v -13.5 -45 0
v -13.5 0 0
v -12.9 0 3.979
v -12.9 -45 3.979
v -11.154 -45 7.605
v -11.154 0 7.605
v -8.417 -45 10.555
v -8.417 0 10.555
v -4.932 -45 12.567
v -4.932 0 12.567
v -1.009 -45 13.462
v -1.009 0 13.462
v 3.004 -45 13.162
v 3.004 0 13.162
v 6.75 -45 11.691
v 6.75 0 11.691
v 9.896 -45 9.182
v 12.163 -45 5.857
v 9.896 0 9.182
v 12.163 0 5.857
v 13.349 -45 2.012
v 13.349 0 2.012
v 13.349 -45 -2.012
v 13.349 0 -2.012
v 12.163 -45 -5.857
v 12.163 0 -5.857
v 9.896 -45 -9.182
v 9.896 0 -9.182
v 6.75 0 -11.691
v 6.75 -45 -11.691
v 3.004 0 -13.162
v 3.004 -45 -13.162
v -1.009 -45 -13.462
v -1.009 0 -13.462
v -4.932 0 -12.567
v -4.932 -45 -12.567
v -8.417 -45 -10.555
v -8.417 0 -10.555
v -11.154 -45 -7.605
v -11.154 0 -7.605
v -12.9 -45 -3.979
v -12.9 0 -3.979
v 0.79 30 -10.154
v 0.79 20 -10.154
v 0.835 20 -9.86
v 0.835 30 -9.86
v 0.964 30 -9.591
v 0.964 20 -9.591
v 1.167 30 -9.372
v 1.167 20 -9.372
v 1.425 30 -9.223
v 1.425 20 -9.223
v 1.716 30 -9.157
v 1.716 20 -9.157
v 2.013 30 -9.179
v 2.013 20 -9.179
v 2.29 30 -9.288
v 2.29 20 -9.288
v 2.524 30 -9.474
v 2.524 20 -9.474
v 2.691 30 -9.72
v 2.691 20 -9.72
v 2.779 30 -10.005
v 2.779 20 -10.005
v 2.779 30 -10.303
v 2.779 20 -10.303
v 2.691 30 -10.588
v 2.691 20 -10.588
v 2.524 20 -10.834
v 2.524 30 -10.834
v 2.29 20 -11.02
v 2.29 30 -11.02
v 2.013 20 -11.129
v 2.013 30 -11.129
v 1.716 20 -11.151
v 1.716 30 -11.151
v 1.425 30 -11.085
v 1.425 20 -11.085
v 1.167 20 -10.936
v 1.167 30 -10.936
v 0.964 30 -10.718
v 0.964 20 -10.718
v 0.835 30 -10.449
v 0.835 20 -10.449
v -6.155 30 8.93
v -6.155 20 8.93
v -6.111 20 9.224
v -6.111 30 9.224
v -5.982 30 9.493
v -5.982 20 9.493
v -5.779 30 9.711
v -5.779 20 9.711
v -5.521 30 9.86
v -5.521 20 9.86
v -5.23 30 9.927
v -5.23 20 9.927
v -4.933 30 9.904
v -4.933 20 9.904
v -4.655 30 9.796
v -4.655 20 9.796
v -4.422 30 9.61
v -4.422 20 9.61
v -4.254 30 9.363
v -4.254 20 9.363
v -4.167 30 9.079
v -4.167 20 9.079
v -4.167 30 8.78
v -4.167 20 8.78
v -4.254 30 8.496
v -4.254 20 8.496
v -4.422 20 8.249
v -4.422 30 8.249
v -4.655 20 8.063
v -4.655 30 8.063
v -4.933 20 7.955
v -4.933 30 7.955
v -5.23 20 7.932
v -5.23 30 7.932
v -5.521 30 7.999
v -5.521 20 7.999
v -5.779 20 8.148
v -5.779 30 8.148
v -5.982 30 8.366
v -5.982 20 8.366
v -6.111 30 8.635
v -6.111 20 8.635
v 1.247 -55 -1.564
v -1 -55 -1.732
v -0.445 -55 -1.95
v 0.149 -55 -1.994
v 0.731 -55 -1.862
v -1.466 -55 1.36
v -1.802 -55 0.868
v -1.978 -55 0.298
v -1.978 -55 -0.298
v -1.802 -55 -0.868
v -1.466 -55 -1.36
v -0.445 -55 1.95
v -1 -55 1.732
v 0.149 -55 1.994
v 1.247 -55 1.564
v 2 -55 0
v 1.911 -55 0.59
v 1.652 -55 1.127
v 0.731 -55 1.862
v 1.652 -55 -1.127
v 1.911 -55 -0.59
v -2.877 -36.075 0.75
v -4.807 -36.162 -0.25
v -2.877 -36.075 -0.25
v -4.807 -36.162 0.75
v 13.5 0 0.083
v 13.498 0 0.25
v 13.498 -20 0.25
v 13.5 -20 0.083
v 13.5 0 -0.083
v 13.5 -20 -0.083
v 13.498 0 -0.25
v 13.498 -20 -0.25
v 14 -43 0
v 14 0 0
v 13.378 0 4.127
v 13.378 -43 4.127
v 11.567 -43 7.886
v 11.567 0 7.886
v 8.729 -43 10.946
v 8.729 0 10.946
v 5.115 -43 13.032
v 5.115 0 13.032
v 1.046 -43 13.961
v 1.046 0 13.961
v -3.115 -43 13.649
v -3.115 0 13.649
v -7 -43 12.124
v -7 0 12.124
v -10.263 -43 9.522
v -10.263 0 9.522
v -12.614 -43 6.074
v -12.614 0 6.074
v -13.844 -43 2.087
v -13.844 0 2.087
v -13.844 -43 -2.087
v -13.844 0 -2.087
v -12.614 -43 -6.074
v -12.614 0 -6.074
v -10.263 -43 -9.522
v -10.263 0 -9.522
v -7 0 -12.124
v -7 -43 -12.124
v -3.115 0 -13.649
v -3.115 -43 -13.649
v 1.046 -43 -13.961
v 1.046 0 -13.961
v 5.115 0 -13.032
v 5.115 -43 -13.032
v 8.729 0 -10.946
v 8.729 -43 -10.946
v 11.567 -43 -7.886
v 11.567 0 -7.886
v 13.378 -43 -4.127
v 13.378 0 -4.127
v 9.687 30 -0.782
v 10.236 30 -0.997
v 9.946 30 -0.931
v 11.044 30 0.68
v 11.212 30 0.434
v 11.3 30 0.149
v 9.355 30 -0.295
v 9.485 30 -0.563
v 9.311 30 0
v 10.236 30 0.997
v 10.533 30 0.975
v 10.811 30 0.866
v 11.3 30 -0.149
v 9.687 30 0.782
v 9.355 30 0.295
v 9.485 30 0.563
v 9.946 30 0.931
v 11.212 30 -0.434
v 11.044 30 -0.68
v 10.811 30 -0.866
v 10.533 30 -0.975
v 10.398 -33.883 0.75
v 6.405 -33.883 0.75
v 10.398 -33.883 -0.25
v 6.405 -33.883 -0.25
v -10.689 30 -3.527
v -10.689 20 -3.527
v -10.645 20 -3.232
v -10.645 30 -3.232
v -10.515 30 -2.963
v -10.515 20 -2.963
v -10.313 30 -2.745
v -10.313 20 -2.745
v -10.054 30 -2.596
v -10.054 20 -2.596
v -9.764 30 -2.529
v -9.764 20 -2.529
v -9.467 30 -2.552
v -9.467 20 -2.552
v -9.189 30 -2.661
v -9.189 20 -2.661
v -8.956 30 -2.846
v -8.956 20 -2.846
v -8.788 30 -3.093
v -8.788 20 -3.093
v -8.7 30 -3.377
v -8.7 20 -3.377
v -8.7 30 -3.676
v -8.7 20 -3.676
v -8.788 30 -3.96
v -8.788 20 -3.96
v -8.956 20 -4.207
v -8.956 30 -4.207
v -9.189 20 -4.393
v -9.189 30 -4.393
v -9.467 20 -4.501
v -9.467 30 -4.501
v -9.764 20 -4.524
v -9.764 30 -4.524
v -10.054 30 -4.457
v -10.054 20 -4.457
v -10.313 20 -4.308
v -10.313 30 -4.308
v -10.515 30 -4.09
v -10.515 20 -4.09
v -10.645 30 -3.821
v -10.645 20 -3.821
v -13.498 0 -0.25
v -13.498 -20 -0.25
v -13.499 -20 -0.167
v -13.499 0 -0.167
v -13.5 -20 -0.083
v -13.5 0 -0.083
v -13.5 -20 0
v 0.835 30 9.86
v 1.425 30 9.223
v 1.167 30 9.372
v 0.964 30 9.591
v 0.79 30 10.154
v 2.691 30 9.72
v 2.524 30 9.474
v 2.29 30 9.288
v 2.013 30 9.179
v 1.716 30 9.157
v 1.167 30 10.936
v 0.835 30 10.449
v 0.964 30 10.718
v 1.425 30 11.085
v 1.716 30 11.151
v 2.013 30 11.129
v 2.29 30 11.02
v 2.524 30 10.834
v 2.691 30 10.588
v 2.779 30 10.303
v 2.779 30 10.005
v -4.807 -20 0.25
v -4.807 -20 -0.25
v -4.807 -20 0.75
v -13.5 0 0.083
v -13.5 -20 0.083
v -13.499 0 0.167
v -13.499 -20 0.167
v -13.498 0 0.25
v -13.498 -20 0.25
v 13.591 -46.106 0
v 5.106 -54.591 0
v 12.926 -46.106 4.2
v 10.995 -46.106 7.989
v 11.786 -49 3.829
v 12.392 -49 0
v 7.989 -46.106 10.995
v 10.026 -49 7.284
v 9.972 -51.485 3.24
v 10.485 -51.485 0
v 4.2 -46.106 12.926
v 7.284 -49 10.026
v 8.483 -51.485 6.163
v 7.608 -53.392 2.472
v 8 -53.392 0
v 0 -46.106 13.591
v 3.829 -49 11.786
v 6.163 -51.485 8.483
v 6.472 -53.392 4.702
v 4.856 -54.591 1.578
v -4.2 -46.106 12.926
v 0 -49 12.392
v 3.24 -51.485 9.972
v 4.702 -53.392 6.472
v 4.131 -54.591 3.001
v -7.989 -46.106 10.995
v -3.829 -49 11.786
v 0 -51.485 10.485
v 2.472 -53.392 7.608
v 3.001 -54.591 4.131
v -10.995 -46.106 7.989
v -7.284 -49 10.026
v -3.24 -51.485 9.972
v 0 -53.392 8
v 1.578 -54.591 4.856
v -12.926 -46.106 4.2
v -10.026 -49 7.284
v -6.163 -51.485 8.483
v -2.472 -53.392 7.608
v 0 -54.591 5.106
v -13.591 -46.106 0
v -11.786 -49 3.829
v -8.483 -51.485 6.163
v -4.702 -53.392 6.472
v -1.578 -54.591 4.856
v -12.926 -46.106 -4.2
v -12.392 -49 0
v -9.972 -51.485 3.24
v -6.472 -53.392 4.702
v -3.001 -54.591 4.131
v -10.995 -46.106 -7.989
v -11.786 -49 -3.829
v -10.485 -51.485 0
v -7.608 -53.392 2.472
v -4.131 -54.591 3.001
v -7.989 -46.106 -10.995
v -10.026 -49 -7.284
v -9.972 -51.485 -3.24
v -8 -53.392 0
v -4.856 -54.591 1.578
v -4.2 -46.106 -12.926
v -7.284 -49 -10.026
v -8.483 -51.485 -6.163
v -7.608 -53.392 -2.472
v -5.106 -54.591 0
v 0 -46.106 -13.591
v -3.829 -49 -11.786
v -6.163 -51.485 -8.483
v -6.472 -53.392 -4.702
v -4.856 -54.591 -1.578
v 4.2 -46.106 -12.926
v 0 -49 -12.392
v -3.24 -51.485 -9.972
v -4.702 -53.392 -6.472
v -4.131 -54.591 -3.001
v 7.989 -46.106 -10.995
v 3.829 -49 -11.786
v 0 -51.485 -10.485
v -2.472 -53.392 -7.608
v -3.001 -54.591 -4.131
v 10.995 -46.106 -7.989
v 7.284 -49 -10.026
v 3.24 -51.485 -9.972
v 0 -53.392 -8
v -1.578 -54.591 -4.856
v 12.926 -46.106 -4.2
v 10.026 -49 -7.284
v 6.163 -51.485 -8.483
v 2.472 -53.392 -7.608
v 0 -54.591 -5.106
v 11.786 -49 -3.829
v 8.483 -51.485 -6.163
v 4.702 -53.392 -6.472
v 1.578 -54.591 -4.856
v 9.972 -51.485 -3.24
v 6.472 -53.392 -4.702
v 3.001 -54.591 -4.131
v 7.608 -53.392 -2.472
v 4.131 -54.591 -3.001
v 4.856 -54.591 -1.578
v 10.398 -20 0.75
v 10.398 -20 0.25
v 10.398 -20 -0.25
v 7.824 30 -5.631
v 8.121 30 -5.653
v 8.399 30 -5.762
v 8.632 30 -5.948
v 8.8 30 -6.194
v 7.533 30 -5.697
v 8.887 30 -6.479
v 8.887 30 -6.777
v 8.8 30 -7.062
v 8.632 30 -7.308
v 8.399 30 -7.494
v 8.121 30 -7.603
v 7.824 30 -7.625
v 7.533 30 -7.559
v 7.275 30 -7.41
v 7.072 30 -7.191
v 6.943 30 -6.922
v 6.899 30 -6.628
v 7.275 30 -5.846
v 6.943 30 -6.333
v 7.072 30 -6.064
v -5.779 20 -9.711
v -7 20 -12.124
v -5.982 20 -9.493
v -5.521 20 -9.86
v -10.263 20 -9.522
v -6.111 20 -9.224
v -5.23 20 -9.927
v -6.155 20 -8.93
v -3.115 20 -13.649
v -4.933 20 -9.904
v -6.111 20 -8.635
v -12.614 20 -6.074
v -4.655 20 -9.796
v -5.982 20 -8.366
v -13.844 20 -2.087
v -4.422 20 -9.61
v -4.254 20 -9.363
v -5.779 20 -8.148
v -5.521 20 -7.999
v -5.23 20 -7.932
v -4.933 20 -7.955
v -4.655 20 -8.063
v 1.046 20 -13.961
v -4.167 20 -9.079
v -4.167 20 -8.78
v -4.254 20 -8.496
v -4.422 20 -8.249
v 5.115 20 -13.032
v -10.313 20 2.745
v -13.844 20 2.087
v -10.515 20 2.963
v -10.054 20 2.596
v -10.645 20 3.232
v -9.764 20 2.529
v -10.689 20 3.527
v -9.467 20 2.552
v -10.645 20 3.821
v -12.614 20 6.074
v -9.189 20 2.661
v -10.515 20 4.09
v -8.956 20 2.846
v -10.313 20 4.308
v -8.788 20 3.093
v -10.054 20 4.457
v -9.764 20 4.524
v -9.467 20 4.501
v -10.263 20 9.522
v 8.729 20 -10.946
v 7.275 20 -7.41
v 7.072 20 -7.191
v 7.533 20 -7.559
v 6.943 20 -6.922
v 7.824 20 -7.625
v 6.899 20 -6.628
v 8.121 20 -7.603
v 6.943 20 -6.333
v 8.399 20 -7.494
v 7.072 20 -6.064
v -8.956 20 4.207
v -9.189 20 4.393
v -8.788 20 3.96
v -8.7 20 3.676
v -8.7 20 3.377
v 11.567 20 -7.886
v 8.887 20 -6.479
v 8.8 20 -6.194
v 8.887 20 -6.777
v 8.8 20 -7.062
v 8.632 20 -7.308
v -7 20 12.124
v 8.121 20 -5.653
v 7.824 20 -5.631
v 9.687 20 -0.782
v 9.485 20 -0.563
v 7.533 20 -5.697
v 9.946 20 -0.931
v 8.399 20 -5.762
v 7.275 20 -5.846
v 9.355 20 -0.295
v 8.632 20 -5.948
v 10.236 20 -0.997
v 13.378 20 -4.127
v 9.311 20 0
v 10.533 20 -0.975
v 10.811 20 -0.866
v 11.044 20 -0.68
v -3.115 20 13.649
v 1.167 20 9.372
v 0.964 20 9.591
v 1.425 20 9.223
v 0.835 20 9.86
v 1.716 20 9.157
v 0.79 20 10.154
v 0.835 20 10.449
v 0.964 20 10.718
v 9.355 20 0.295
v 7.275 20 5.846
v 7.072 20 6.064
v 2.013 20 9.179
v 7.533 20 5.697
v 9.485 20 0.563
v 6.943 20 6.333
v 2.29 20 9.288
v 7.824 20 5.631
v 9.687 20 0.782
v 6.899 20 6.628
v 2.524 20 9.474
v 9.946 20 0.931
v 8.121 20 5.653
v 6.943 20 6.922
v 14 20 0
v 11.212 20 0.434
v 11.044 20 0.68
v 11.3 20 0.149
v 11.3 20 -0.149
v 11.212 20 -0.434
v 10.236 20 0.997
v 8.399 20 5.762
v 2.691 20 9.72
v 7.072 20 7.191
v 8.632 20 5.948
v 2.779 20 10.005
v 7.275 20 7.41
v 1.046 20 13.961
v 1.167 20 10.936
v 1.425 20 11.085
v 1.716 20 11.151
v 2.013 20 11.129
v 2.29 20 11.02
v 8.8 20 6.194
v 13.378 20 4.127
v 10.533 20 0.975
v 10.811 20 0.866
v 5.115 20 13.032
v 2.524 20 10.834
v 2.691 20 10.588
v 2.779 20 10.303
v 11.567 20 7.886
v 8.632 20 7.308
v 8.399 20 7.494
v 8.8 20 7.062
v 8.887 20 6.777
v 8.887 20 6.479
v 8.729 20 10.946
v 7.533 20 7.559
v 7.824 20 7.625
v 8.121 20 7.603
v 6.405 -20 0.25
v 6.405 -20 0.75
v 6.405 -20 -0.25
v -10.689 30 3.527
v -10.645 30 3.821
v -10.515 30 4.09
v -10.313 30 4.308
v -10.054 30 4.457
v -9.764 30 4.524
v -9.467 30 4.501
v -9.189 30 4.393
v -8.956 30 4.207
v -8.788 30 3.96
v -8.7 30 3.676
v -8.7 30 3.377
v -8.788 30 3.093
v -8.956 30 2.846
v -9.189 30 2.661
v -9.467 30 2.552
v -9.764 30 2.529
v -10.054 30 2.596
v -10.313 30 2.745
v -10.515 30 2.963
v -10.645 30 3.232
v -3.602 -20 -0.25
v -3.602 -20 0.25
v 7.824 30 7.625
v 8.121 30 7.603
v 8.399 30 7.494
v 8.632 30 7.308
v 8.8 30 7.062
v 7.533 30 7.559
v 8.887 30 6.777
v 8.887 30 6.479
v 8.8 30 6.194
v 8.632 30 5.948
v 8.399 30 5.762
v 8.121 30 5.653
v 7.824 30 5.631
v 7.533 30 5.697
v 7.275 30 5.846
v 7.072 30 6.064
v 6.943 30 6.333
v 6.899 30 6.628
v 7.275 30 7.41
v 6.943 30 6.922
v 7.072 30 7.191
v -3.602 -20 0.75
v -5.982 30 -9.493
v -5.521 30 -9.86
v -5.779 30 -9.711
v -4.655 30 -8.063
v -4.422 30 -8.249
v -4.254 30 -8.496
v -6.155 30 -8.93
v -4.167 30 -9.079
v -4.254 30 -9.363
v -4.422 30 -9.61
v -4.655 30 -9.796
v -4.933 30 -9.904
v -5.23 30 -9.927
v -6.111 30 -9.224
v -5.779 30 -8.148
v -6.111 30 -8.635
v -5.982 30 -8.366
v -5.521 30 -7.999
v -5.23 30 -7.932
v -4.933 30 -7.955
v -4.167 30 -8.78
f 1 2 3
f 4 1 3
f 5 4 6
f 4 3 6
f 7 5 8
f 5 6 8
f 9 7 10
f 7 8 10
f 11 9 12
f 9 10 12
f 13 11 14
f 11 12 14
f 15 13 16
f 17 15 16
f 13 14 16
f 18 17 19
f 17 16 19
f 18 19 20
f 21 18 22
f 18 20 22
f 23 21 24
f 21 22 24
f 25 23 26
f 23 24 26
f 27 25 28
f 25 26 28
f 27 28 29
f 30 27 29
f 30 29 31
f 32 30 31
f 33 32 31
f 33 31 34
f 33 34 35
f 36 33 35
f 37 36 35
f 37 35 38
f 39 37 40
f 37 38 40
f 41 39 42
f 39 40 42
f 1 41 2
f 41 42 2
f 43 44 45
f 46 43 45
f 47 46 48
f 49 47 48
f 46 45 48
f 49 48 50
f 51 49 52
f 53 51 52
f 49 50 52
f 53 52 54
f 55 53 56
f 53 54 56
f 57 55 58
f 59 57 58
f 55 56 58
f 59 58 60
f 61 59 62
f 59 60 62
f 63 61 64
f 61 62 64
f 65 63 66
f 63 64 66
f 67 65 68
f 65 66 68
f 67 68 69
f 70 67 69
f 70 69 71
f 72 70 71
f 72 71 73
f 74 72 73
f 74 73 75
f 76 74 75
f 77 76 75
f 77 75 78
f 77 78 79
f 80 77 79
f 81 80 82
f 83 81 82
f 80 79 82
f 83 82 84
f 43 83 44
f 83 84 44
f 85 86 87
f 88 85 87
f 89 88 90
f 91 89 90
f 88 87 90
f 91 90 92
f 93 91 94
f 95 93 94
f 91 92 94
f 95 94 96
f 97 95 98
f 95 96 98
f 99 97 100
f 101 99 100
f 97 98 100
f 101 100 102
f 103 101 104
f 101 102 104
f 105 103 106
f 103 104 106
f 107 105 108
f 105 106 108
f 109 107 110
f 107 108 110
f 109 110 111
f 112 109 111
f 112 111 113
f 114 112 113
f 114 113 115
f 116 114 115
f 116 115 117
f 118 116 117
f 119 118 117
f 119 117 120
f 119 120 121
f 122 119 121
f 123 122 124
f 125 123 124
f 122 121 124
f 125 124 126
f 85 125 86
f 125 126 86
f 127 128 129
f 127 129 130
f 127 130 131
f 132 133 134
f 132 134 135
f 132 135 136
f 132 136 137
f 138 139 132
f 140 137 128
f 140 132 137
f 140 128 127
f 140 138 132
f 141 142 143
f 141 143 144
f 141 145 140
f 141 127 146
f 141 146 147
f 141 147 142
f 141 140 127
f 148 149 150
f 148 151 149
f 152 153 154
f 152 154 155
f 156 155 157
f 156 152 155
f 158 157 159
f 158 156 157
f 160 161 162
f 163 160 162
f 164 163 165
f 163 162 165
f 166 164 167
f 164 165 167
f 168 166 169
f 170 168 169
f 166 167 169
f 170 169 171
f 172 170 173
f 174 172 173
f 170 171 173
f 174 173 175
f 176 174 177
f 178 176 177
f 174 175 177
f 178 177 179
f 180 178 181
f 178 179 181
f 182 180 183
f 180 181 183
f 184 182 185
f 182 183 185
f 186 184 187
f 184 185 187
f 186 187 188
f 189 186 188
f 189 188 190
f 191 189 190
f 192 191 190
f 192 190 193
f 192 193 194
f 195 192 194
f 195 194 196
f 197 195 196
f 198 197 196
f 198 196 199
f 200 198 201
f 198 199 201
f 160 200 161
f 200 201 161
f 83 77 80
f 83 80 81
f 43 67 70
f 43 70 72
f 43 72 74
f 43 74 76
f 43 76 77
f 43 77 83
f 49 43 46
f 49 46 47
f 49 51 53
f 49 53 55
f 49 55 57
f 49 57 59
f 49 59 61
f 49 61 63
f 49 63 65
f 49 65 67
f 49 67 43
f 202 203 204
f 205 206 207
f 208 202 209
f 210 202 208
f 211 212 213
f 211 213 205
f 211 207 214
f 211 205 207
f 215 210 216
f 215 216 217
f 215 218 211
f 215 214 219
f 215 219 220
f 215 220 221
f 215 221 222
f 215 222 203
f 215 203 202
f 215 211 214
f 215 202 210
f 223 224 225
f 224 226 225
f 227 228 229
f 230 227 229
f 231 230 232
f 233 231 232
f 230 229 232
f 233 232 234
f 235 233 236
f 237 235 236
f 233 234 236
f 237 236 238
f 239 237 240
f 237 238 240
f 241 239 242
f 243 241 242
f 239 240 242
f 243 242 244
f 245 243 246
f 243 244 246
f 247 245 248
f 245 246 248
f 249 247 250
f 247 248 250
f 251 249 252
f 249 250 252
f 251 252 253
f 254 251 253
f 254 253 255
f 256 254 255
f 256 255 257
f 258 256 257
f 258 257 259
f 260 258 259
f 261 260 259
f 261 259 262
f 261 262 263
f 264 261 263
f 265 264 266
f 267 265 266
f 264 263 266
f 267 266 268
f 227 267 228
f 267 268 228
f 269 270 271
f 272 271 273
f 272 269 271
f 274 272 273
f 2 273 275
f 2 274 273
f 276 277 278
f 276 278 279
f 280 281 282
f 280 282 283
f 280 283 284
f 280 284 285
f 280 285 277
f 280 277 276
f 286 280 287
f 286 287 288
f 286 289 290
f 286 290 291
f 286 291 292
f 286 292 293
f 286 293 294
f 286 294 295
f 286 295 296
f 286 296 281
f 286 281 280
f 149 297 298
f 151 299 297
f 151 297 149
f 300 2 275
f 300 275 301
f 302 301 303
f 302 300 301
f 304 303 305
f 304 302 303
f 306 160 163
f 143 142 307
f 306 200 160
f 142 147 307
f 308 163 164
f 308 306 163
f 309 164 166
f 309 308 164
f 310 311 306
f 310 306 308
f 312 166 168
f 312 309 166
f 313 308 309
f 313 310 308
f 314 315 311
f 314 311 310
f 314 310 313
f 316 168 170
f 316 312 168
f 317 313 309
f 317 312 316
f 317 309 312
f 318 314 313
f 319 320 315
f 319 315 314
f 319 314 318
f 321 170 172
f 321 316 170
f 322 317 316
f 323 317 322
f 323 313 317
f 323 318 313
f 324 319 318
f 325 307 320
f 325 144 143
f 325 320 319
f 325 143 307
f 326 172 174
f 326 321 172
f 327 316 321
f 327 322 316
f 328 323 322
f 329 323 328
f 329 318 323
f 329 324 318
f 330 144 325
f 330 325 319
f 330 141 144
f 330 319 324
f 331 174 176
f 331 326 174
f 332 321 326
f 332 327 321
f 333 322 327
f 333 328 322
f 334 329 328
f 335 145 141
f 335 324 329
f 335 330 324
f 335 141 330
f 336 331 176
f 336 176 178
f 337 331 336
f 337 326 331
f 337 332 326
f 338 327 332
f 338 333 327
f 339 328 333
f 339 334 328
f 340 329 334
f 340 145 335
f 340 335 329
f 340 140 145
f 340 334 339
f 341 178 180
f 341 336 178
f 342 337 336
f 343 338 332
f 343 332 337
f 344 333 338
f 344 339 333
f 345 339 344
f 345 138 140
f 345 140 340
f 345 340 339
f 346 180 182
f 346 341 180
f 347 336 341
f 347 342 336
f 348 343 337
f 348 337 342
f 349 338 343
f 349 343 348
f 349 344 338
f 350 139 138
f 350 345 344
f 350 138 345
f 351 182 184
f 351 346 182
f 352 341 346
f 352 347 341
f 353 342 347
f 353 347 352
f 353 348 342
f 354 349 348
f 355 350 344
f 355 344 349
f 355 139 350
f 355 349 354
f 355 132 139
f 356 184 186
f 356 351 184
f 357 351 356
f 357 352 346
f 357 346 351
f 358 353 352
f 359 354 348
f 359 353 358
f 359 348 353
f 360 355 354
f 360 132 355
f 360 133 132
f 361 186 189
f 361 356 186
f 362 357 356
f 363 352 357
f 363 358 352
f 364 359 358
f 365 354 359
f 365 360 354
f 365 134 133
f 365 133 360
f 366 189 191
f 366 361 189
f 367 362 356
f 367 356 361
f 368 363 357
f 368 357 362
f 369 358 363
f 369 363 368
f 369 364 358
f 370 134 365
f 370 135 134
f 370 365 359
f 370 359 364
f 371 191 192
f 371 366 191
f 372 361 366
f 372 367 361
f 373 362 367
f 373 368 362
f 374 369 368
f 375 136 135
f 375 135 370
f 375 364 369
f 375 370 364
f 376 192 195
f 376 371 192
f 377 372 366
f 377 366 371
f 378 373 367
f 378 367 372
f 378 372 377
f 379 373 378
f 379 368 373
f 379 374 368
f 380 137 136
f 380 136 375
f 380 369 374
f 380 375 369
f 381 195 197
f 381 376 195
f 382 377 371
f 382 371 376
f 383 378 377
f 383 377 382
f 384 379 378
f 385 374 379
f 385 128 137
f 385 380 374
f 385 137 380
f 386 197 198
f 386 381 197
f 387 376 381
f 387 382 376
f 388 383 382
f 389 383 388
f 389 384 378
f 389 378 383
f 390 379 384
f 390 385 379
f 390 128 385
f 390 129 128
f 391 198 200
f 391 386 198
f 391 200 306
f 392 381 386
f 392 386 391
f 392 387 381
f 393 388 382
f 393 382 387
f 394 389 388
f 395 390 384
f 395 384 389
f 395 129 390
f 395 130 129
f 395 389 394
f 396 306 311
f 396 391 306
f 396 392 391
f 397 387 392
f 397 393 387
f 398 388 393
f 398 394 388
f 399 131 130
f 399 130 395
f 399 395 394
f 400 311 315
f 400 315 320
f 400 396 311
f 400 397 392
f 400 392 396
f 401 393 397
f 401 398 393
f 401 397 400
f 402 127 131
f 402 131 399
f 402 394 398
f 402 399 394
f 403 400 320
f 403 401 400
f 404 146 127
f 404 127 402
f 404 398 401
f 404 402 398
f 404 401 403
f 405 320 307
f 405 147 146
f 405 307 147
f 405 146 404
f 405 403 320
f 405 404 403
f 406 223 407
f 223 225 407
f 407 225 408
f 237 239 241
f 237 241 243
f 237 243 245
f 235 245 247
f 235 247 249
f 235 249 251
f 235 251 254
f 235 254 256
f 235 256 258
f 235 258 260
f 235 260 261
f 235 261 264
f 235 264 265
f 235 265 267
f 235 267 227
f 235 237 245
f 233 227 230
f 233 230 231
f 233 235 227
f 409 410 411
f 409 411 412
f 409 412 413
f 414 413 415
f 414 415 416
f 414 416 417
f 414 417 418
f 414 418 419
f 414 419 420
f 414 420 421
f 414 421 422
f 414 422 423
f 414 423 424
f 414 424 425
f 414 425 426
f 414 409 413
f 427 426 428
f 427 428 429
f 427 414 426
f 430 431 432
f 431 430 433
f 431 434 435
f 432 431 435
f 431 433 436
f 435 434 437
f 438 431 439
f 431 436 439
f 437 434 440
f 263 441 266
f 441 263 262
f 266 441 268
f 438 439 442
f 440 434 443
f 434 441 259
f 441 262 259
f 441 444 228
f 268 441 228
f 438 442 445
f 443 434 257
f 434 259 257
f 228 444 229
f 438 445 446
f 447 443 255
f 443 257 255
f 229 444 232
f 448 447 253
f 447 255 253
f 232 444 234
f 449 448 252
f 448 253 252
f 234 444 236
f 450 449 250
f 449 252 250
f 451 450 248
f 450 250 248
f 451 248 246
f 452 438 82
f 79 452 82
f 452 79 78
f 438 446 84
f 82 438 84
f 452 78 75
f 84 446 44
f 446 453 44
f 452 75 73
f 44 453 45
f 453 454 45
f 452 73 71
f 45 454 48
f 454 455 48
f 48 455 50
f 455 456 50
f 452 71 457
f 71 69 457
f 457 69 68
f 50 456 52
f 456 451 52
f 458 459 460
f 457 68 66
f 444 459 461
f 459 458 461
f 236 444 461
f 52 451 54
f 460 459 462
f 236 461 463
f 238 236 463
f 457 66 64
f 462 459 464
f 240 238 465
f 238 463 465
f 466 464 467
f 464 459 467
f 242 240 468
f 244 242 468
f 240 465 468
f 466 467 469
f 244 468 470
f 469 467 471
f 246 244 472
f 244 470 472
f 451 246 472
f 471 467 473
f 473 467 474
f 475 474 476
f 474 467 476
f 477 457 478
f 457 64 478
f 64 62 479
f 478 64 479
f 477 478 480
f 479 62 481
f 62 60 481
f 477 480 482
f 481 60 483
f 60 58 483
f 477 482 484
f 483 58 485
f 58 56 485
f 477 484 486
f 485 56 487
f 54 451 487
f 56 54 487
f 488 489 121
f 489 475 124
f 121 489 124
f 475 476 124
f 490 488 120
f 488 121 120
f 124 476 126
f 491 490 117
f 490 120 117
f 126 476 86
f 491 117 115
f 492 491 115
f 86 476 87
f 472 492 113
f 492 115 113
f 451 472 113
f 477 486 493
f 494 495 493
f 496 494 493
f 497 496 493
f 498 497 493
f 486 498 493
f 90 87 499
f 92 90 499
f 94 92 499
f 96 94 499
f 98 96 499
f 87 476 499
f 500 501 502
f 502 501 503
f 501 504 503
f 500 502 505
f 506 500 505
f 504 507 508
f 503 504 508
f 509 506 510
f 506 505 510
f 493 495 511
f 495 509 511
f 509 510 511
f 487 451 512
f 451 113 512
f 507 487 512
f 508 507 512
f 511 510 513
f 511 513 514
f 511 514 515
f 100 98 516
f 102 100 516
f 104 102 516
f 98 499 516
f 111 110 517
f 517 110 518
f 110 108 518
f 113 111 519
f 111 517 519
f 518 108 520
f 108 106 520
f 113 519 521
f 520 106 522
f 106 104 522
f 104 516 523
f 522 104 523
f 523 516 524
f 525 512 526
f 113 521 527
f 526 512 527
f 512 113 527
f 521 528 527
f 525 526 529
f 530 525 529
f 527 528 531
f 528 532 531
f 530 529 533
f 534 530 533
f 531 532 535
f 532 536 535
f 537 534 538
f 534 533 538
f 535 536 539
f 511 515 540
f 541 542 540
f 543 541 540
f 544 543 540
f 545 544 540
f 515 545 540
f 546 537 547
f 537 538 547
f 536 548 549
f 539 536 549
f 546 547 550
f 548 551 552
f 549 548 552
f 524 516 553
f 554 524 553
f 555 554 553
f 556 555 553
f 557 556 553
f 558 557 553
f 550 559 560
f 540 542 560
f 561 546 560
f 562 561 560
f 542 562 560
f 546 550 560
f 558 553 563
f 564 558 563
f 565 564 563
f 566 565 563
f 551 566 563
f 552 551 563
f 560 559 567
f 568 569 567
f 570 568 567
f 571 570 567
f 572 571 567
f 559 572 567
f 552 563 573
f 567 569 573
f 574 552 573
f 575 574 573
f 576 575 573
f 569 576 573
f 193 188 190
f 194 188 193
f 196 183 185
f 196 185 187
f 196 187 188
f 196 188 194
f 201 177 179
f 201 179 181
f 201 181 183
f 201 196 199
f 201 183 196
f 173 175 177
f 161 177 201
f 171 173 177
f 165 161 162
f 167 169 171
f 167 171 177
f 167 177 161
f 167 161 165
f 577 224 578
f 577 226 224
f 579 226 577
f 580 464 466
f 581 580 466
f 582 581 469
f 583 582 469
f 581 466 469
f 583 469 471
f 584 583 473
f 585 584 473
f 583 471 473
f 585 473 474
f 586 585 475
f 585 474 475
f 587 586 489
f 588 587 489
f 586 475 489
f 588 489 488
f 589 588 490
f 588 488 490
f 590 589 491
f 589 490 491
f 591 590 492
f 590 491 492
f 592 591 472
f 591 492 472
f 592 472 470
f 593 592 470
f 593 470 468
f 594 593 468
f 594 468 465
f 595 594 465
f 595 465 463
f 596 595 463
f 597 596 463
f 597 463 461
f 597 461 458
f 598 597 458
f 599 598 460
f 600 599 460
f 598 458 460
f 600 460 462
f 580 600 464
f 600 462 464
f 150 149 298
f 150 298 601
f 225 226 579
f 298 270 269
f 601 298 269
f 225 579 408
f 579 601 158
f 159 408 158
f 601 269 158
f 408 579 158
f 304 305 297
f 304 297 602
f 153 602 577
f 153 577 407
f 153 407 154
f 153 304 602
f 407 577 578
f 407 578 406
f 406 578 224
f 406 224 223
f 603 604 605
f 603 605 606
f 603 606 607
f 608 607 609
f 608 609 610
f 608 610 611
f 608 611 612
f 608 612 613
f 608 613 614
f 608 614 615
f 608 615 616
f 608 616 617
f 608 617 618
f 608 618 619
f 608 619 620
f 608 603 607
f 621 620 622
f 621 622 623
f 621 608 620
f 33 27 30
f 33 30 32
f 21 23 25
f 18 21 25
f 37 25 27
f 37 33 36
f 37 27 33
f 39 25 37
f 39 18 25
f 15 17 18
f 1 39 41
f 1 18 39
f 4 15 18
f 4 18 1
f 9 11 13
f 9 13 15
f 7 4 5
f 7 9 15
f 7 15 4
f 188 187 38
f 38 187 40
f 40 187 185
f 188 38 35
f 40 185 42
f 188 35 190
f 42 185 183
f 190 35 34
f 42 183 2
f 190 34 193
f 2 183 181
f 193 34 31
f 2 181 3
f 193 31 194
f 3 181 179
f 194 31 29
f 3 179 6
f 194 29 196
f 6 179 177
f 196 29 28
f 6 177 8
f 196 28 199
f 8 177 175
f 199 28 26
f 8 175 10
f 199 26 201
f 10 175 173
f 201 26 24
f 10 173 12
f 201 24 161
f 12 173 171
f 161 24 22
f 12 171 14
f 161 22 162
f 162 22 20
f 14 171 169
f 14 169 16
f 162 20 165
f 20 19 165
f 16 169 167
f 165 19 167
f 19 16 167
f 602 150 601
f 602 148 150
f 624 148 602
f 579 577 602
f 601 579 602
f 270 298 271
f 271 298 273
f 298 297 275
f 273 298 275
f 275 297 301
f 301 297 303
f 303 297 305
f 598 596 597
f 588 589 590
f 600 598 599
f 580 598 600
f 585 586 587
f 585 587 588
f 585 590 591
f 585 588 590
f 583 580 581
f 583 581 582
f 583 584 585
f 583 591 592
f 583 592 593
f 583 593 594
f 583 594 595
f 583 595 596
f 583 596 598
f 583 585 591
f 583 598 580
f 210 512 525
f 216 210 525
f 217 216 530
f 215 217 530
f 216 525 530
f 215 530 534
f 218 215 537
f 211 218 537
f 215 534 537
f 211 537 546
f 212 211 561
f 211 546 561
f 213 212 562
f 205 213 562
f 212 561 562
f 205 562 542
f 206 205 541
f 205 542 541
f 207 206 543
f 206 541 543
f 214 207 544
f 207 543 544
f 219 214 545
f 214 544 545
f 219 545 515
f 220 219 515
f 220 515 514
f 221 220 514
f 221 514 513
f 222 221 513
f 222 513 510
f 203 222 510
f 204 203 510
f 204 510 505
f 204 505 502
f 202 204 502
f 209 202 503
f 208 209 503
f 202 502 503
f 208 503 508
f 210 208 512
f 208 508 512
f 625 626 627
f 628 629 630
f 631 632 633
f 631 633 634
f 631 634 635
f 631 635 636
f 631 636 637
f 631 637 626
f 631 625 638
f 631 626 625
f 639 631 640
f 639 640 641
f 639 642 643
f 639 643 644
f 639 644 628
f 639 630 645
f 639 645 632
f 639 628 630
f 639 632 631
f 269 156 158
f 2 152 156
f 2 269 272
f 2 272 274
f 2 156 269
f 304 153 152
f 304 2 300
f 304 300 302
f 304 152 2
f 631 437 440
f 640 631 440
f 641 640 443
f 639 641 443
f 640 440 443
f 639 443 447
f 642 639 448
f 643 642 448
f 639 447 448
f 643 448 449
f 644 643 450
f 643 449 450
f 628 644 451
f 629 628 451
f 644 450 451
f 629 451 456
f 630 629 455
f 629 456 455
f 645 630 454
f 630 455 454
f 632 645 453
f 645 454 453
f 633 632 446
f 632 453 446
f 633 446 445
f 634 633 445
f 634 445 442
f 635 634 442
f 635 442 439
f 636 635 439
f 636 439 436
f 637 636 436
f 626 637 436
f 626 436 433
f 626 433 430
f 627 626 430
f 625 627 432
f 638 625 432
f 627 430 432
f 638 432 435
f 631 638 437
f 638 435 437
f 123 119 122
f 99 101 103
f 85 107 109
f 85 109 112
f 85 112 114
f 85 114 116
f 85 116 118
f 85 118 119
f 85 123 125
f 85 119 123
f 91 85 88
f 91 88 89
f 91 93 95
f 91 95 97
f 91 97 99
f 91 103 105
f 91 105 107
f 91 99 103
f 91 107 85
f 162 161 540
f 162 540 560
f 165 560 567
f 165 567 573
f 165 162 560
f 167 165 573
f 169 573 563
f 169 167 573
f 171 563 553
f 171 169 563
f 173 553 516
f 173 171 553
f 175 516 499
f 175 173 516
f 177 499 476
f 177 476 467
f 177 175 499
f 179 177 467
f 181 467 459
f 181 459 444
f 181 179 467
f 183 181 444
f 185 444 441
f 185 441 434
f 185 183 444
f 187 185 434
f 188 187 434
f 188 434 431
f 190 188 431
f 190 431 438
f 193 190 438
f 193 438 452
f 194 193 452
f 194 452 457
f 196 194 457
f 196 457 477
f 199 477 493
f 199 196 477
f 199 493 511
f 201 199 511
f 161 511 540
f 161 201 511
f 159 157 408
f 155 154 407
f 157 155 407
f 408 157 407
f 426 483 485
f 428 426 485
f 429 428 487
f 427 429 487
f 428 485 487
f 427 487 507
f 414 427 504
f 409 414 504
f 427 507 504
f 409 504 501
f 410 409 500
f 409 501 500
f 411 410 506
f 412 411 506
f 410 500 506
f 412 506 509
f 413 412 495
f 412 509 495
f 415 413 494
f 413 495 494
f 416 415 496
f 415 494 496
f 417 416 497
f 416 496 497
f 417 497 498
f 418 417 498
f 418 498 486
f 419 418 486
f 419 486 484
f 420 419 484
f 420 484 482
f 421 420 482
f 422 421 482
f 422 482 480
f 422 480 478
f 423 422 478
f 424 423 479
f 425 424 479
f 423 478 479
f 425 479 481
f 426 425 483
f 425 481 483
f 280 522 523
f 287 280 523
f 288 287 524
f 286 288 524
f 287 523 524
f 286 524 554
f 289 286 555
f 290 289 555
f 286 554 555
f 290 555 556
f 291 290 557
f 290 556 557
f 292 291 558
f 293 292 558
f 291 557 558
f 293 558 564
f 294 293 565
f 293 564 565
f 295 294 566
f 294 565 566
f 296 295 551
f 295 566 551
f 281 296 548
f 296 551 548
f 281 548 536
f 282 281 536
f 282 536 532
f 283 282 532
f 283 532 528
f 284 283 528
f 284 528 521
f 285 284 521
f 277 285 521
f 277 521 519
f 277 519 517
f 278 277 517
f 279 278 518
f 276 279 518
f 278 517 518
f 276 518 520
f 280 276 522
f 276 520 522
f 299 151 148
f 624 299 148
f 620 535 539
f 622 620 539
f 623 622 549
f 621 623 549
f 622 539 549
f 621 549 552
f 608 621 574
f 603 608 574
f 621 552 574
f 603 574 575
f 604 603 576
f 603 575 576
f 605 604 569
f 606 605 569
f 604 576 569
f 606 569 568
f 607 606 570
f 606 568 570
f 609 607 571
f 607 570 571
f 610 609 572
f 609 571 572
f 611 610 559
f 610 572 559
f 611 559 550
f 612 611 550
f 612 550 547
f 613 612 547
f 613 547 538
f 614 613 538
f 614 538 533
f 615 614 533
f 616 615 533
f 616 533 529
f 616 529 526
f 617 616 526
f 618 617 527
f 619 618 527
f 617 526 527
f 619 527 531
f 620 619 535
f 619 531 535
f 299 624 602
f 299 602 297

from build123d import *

# Parameters (mm, degrees)
F0_R      = 14
F1_DEPTH  = 25
F2_DEPTH  = 55
F3_R      = 12
F4_R      = 13.5
F5_DEPTH  = 45
F7_DEPTH  = 20
F8_W      = 3.9925682358
F8_H      = 13.8830037415
F9_DEPTH  = 0.5
F10_R     = 14
F11_DEPTH = 20
F12_R     = 1
F13_DEPTH = 10


with BuildPart() as f1:
    # F0 (on Front) → F1 (new body)
    with BuildSketch(Plane.XZ):
        Circle(F0_R)
    extrude(amount=F1_DEPTH)

    # F0 (on Front) → F2 (join)
    with BuildSketch(Plane.XZ):
        Circle(F0_R)
    extrude(amount=F2_DEPTH)

    # F3
    f3_edges = [f1.edges().sort_by_distance(p)[0] for p in [
        (-14, -55, 0),
    ]]
    fillet(f3_edges, radius=F3_R)

    # F4 (on face) → F5 (cut)
    with BuildSketch(Plane(origin=(0, 0, 0), x_dir=(-1, 0, 0), z_dir=(0, 1, 0))):
        Circle(F4_R)
    extrude(amount=-F5_DEPTH, mode=Mode.SUBTRACT)


with BuildPart() as f7:
    # F6 (on face) → F7 (new body)
    with BuildSketch(Plane(origin=(0, 0, 0), x_dir=(-1, 0, 0), z_dir=(0, 1, 0))):
        with BuildLine():
            Line((13.4976849867, 0.25), (-13.4976849867, 0.25))
            ThreePointArc((-13.4976849867, 0.25), (-13.5, 0), (-13.4976849867, -0.25))
            Line((-13.4976849867, -0.25), (-12.0585767334, -0.25))
            Line((-12.0585767334, -0.25), (13.4976849867, -0.25))
            ThreePointArc((13.4976849867, -0.25), (13.4994212343, -0.1250053592), (13.5, 0))
            ThreePointArc((13.5, 0), (13.4994212343, 0.1250053592), (13.4976849867, 0.25))
        make_face()
    extrude(amount=-F7_DEPTH)

    # F8 (on face) → F9 (join, symmetric)
    with BuildSketch(Plane.XY.offset(0.25)):
        with Locations((8.4014490712, -26.9415018708)):
            Rectangle(F8_W, F8_H)
        Polygon((-2.8766661417, -36.074513793), (-3.6023748107, -20), (-4.8067043235, -20), (-4.8067043235, -36.1616483377), align=None)
    extrude(amount=F9_DEPTH, both=True)


with BuildPart() as f11:
    # F10 (on face) → F11 (new body)
    with BuildSketch(Plane.XZ):
        Circle(F10_R)
    extrude(amount=-F11_DEPTH)

    # F12 (on face) → F13 (join)
    with BuildSketch(Plane(origin=(0, 20, 0), x_dir=(-1, 0, 0), z_dir=(0, 1, 0))):
        with Locations((5.1554560206, -8.9295117639)):
            Circle(F12_R)
        with Locations((9.6890879587, -3.5265396142)):
            Circle(F12_R)
        with Locations((9.6890879587, 3.5265396142)):
            Circle(F12_R)
        with Locations((5.1554560206, 8.9295117639)):
            Circle(F12_R)
        with Locations((-1.790471086, 10.1542661189)):
            Circle(F12_R)
        with Locations((-7.8986168727, 6.6277265047)):
            Circle(F12_R)
        with Locations((-10.3109120413, 0)):
            Circle(F12_R)
        with Locations((-7.8986168727, -6.6277265047)):
            Circle(F12_R)
        with Locations((-1.790471086, -10.1542661189)):
            Circle(F12_R)
    extrude(amount=F13_DEPTH)


solid = Compound([f1.part, f7.part, f11.part])
